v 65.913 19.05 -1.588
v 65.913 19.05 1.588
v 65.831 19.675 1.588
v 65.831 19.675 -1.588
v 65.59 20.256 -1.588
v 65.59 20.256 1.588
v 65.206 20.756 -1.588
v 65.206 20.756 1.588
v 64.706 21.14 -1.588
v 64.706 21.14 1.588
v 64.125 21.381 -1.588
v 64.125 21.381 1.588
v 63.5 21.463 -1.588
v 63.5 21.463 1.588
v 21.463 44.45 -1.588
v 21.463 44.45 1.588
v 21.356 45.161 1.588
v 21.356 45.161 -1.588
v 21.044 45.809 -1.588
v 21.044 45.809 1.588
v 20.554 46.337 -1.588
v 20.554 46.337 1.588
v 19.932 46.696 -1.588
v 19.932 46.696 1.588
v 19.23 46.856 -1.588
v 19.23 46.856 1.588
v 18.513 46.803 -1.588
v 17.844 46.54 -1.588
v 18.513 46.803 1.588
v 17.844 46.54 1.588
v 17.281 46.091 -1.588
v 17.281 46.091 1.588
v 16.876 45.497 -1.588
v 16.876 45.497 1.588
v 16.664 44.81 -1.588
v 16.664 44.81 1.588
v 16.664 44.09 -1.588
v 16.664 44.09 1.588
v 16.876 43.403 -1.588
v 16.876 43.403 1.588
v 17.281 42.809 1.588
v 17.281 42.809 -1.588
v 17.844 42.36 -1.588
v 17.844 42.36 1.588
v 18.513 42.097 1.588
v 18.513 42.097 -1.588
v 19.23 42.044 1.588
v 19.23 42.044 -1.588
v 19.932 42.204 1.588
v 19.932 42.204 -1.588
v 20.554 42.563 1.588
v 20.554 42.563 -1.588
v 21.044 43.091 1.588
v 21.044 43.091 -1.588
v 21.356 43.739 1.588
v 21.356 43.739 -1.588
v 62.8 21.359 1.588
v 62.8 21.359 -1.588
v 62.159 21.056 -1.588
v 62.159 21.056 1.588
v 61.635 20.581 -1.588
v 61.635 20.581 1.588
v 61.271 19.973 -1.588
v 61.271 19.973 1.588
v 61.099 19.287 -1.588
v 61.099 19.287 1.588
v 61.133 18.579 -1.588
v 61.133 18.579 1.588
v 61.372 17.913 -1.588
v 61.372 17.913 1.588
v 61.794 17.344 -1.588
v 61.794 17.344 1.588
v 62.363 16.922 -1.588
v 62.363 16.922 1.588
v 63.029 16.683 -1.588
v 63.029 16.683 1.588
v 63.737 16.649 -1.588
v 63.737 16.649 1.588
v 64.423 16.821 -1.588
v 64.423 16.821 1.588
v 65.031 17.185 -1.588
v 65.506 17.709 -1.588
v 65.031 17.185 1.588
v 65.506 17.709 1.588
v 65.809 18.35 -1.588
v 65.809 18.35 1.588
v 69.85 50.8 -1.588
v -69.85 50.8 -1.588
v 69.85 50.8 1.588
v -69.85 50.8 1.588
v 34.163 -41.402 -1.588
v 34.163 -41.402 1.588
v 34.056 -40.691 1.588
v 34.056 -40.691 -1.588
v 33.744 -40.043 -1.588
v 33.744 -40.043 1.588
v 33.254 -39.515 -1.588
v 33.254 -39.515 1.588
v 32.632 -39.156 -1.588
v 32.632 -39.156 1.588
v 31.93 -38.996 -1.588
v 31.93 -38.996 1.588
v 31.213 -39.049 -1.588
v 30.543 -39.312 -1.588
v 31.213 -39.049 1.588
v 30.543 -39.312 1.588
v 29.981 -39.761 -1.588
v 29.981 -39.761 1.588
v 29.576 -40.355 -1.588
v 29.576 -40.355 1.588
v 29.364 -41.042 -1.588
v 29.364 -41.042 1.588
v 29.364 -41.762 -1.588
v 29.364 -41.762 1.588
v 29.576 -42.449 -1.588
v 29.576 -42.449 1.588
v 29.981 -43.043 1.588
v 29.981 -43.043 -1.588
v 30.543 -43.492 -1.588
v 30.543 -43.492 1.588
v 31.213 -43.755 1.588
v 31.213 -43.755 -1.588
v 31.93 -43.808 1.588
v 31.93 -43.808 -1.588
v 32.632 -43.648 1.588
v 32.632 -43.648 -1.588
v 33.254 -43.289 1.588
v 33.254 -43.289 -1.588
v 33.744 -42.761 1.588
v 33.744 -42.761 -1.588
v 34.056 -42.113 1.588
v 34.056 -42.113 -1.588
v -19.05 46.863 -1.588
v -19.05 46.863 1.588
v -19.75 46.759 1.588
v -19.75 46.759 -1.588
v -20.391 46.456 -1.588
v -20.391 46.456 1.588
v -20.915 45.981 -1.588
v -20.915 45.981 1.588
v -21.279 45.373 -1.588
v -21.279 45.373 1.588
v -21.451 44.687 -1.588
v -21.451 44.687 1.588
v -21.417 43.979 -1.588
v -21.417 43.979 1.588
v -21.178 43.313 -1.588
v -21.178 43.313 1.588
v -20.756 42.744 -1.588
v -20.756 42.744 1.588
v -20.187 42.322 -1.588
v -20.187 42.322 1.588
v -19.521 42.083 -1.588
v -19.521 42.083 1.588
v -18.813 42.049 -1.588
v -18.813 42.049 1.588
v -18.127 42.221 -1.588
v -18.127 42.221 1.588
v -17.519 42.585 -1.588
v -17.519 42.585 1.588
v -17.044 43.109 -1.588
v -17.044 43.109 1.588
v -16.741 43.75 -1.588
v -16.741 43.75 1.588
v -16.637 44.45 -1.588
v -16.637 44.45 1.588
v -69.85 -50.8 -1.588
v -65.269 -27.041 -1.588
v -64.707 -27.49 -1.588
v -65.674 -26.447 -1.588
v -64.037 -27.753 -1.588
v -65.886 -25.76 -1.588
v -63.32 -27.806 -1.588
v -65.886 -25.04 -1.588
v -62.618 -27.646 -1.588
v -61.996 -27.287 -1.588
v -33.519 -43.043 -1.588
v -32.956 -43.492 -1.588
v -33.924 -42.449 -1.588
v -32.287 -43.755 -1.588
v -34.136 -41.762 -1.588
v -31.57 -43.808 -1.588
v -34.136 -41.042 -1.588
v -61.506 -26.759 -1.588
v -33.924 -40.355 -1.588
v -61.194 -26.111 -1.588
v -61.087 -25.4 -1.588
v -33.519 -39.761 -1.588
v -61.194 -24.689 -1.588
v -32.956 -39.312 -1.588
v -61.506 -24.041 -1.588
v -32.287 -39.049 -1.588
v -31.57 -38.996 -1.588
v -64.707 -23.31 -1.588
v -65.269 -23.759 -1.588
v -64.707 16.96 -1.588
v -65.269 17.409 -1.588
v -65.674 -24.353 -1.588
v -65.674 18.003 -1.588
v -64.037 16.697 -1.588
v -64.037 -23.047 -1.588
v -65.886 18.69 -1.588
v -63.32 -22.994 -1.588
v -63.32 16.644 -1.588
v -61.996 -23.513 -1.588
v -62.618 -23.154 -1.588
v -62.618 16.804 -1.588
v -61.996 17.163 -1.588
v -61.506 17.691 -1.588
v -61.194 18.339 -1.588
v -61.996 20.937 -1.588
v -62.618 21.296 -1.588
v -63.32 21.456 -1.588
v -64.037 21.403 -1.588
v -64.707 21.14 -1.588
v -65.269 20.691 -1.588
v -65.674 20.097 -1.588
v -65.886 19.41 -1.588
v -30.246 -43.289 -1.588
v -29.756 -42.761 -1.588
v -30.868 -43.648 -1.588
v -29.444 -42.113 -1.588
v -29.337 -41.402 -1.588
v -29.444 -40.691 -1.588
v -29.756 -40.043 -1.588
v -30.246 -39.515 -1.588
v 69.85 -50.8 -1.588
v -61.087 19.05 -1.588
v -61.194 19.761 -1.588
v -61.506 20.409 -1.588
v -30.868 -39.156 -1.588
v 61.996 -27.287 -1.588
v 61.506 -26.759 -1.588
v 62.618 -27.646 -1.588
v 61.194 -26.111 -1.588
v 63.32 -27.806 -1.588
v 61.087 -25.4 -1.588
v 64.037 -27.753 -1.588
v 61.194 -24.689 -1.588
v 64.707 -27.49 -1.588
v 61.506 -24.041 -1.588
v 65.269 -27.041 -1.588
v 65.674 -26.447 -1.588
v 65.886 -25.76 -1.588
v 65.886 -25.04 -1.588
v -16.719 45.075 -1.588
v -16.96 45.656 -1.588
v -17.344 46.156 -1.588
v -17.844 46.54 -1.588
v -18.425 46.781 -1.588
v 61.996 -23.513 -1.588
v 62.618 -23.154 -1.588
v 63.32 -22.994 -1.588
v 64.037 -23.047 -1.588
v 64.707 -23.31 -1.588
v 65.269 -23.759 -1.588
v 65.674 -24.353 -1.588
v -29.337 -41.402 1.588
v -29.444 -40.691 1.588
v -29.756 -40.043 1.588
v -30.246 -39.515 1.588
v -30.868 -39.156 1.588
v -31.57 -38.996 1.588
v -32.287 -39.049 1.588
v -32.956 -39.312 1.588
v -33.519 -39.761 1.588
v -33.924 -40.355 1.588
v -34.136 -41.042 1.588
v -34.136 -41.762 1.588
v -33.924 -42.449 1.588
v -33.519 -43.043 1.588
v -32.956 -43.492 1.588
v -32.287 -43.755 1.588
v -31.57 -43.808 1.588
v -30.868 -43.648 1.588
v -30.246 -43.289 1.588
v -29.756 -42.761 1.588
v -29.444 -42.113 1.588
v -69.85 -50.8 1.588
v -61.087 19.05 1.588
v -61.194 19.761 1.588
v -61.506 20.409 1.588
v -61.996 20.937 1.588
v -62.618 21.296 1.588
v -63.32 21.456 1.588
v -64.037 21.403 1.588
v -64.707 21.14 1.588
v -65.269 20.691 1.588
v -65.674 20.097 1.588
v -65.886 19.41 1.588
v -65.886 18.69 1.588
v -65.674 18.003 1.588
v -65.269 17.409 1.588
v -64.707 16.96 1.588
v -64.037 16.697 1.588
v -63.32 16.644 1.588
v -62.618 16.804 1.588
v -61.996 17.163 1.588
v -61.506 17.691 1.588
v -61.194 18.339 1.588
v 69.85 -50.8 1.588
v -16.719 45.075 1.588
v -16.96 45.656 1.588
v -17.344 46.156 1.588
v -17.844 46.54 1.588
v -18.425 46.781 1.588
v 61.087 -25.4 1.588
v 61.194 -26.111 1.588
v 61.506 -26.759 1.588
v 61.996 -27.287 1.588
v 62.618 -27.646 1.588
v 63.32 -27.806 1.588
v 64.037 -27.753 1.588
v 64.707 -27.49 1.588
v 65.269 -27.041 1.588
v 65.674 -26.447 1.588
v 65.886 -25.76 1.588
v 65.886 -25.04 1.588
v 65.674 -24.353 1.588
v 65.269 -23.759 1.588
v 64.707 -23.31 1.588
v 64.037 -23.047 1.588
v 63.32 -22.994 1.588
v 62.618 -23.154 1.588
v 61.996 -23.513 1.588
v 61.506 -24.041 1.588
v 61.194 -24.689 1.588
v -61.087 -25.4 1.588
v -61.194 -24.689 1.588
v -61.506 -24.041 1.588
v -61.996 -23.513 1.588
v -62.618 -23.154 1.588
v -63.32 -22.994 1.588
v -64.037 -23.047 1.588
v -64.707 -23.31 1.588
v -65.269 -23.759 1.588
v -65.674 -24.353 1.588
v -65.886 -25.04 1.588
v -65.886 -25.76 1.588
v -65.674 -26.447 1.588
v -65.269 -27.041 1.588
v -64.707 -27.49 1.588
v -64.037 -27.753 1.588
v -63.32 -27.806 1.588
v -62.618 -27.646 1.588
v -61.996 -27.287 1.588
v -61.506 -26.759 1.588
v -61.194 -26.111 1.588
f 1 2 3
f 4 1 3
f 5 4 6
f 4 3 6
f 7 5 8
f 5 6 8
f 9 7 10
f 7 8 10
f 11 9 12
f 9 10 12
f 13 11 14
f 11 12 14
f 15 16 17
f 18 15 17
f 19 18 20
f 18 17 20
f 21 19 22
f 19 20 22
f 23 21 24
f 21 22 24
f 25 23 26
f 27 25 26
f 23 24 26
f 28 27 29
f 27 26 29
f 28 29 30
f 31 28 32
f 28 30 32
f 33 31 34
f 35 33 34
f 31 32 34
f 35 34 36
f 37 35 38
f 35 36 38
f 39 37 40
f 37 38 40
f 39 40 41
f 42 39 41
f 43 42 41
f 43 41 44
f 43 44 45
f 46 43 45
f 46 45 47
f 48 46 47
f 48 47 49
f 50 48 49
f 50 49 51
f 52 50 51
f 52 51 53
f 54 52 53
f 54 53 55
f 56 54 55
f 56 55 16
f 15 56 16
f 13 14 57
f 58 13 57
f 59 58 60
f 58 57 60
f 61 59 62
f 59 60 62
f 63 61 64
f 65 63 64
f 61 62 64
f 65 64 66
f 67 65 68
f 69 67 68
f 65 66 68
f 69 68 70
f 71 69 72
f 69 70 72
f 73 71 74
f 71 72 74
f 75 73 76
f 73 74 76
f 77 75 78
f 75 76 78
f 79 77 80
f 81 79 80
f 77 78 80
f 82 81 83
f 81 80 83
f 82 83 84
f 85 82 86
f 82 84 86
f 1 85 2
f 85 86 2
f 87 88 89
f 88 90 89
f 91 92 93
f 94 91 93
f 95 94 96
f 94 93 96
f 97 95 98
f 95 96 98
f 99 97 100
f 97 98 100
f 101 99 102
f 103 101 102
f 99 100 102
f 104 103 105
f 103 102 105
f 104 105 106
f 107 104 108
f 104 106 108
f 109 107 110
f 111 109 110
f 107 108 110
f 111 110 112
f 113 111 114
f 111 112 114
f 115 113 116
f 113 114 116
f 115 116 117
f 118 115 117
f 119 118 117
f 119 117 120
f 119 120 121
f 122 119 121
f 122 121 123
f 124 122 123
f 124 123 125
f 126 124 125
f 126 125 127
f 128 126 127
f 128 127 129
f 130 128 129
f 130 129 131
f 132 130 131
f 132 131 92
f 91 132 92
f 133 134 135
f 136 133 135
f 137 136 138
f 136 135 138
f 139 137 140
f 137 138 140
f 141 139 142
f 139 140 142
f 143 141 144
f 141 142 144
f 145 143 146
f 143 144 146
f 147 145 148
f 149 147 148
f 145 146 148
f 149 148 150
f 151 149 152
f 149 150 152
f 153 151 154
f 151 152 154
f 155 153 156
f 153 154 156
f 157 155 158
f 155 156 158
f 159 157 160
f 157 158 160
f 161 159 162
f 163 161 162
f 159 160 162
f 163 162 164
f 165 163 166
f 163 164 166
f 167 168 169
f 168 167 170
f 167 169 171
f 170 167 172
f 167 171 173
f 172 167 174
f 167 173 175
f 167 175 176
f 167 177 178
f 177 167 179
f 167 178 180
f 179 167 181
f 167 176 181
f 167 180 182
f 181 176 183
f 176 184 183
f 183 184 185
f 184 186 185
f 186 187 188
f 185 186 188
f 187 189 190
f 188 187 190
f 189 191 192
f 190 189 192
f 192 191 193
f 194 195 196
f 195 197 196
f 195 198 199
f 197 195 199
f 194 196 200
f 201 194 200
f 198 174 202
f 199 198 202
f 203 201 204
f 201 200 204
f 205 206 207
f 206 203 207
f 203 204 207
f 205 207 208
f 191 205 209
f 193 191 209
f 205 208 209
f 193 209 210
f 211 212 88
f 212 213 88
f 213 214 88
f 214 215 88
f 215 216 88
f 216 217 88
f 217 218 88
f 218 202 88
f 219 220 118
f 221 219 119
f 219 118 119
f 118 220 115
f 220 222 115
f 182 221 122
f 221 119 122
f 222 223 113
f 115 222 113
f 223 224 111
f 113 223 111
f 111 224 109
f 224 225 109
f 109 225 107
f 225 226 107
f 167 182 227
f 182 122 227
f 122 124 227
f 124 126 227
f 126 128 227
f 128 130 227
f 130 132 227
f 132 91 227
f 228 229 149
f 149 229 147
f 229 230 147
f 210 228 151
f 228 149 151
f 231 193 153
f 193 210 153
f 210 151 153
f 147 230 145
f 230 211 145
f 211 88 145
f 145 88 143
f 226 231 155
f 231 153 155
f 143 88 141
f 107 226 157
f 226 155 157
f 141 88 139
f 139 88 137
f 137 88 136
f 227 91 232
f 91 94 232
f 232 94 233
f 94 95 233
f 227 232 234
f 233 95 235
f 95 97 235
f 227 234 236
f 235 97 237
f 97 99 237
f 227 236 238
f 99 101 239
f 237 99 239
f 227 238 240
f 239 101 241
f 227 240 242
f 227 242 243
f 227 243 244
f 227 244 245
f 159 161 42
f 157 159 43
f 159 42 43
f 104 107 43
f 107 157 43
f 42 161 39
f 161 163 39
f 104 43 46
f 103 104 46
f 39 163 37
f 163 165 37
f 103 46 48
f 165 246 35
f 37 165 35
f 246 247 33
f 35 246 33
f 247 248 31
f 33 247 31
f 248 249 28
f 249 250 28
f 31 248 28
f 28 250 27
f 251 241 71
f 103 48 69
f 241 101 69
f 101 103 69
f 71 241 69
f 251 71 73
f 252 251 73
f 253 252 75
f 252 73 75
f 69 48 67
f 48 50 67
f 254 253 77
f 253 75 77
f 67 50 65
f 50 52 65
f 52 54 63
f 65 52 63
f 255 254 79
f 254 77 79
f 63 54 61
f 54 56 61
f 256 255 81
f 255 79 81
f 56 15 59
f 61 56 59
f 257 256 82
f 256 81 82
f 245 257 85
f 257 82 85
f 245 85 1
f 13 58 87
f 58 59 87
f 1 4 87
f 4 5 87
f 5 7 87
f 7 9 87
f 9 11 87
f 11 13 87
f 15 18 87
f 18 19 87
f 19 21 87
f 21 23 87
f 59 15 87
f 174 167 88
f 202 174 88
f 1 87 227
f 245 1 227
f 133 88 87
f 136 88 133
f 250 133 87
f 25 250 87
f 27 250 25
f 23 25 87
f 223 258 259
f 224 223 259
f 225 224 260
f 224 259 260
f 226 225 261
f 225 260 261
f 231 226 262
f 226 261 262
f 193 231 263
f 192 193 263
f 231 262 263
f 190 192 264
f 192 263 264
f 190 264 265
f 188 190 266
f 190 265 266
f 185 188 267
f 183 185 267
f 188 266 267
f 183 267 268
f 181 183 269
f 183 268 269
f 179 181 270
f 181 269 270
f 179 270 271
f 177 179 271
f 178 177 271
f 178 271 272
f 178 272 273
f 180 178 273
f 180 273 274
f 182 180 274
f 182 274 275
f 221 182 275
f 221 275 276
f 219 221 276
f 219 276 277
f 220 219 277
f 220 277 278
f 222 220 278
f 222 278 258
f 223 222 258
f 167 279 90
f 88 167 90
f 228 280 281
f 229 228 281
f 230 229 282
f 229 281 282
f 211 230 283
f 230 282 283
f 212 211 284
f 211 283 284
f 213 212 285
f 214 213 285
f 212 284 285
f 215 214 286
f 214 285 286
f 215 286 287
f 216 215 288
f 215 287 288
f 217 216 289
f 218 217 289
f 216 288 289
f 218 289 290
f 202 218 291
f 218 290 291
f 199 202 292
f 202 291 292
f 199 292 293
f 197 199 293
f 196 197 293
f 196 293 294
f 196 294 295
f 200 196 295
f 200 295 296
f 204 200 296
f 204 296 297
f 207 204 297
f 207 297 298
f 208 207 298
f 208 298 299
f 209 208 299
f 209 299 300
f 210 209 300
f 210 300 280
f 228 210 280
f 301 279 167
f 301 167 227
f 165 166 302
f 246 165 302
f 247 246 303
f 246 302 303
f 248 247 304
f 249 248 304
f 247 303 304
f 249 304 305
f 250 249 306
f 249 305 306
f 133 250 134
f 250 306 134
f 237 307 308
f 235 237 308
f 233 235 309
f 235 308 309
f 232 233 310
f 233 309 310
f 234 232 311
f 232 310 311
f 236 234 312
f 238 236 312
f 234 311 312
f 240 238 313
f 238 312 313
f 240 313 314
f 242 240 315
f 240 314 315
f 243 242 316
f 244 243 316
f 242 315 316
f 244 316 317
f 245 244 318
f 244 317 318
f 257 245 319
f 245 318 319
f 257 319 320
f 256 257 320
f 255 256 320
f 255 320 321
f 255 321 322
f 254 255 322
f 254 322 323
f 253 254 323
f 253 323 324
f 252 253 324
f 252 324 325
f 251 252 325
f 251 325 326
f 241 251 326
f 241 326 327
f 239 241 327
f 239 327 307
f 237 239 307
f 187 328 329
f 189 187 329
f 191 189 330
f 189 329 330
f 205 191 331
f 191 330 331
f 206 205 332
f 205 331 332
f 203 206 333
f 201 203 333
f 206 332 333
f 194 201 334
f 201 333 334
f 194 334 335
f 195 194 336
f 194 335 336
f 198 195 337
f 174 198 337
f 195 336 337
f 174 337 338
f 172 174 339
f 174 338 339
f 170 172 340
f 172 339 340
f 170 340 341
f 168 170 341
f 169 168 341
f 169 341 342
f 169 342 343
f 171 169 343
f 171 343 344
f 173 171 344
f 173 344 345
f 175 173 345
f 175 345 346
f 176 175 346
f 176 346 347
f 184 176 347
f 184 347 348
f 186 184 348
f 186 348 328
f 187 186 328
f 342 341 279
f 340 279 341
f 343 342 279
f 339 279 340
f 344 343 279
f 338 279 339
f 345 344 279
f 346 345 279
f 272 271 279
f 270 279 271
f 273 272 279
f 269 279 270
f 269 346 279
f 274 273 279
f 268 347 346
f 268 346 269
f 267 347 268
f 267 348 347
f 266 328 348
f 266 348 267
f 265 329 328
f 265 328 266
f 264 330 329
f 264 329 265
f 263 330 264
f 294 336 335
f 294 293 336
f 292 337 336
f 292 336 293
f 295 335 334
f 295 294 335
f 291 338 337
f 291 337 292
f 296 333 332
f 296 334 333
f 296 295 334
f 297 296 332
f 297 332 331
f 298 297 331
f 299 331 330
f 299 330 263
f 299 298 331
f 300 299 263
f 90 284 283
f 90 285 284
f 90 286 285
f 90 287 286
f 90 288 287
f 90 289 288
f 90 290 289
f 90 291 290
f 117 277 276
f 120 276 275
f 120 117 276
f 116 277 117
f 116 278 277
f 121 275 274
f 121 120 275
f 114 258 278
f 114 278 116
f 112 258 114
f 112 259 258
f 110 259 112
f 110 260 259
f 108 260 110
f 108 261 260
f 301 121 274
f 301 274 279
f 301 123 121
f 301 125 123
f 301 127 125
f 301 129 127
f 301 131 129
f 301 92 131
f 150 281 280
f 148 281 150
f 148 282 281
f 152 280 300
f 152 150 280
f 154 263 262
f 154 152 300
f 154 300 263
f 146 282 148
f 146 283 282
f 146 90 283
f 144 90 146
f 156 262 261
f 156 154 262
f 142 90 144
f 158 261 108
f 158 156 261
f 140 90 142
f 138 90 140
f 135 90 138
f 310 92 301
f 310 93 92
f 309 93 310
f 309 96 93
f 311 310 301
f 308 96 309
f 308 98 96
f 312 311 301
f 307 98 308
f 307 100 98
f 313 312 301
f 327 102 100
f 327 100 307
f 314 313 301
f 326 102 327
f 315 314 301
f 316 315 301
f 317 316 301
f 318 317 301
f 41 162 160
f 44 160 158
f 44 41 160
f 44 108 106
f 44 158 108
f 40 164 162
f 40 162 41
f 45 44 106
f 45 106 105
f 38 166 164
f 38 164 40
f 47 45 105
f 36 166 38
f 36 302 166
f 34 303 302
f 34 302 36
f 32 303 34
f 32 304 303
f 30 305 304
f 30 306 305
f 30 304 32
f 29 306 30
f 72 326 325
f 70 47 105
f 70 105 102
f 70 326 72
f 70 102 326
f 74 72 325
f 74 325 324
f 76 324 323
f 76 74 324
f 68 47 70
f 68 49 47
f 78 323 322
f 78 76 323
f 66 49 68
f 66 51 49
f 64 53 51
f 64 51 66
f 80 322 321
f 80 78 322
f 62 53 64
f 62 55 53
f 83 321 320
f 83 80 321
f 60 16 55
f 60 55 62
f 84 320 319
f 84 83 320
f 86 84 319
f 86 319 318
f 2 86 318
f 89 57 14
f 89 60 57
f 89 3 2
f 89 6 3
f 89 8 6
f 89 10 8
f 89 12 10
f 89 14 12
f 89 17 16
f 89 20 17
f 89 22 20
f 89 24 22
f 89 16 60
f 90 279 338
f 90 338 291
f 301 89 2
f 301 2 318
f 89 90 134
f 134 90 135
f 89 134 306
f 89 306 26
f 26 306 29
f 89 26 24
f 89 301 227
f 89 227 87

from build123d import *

# Parameters (mm, degrees)
F0_W     = 139.7
F0_H     = 101.6
F1_DEPTH = 1.5875
F2_R     = 2.413
F3_DEPTH = 25.4


with BuildPart() as f1:
    # F0 (on Top) → F1 (new body, symmetric)
    with BuildSketch(Plane.XY):
        Rectangle(F0_W, F0_H)
    extrude(amount=F1_DEPTH, both=True)

    # F2 (on face) → F3 (cut)
    with BuildSketch(Plane.XY.offset(1.5875)):
        with BuildLine():
            Line((63.5, -25.4), (65.913, -25.4))
            ThreePointArc((65.913, -25.4), (63.5, -22.987), (61.087, -25.4))
            Line((61.087, -25.4), (63.5, -25.4))
        make_face()
        with BuildLine():
            ThreePointArc((-65.913, -25.4), (-63.5, -27.813), (-61.087, -25.4))
            Line((-61.087, -25.4), (-65.913, -25.4))
        make_face()
        with BuildLine():
            Line((-65.913, -25.4), (-61.087, -25.4))
            ThreePointArc((-61.087, -25.4), (-63.5, -22.987), (-65.913, -25.4))
        make_face()
        with BuildLine():
            ThreePointArc((61.087, -25.4), (63.5, -27.813), (65.913, -25.4))
            Line((65.913, -25.4), (63.5, -25.4))
            Line((63.5, -25.4), (61.087, -25.4))
        make_face()
        with BuildLine():
            ThreePointArc((63.5, 21.463), (61.793751337, 17.343751337), (65.913, 19.05))
            ThreePointArc((65.913, 19.05), (65.206248663, 20.756248663), (63.5, 21.463))
        make_face()
        with Locations((19.05, 44.45)):
            Circle(F2_R)
        with BuildLine():
            ThreePointArc((-19.05, 46.863), (-20.756248663, 42.743751337), (-16.637, 44.45))
            ThreePointArc((-16.637, 44.45), (-17.343751337, 46.156248663), (-19.05, 46.863))
        make_face()
        with Locations((-63.5, 19.05)):
            Circle(F2_R)
        with Locations((-31.75, -41.402)):
            Circle(F2_R)
        with Locations((31.75, -41.402)):
            Circle(F2_R)
    extrude(amount=-F3_DEPTH, mode=Mode.SUBTRACT)


solid = f1.part
